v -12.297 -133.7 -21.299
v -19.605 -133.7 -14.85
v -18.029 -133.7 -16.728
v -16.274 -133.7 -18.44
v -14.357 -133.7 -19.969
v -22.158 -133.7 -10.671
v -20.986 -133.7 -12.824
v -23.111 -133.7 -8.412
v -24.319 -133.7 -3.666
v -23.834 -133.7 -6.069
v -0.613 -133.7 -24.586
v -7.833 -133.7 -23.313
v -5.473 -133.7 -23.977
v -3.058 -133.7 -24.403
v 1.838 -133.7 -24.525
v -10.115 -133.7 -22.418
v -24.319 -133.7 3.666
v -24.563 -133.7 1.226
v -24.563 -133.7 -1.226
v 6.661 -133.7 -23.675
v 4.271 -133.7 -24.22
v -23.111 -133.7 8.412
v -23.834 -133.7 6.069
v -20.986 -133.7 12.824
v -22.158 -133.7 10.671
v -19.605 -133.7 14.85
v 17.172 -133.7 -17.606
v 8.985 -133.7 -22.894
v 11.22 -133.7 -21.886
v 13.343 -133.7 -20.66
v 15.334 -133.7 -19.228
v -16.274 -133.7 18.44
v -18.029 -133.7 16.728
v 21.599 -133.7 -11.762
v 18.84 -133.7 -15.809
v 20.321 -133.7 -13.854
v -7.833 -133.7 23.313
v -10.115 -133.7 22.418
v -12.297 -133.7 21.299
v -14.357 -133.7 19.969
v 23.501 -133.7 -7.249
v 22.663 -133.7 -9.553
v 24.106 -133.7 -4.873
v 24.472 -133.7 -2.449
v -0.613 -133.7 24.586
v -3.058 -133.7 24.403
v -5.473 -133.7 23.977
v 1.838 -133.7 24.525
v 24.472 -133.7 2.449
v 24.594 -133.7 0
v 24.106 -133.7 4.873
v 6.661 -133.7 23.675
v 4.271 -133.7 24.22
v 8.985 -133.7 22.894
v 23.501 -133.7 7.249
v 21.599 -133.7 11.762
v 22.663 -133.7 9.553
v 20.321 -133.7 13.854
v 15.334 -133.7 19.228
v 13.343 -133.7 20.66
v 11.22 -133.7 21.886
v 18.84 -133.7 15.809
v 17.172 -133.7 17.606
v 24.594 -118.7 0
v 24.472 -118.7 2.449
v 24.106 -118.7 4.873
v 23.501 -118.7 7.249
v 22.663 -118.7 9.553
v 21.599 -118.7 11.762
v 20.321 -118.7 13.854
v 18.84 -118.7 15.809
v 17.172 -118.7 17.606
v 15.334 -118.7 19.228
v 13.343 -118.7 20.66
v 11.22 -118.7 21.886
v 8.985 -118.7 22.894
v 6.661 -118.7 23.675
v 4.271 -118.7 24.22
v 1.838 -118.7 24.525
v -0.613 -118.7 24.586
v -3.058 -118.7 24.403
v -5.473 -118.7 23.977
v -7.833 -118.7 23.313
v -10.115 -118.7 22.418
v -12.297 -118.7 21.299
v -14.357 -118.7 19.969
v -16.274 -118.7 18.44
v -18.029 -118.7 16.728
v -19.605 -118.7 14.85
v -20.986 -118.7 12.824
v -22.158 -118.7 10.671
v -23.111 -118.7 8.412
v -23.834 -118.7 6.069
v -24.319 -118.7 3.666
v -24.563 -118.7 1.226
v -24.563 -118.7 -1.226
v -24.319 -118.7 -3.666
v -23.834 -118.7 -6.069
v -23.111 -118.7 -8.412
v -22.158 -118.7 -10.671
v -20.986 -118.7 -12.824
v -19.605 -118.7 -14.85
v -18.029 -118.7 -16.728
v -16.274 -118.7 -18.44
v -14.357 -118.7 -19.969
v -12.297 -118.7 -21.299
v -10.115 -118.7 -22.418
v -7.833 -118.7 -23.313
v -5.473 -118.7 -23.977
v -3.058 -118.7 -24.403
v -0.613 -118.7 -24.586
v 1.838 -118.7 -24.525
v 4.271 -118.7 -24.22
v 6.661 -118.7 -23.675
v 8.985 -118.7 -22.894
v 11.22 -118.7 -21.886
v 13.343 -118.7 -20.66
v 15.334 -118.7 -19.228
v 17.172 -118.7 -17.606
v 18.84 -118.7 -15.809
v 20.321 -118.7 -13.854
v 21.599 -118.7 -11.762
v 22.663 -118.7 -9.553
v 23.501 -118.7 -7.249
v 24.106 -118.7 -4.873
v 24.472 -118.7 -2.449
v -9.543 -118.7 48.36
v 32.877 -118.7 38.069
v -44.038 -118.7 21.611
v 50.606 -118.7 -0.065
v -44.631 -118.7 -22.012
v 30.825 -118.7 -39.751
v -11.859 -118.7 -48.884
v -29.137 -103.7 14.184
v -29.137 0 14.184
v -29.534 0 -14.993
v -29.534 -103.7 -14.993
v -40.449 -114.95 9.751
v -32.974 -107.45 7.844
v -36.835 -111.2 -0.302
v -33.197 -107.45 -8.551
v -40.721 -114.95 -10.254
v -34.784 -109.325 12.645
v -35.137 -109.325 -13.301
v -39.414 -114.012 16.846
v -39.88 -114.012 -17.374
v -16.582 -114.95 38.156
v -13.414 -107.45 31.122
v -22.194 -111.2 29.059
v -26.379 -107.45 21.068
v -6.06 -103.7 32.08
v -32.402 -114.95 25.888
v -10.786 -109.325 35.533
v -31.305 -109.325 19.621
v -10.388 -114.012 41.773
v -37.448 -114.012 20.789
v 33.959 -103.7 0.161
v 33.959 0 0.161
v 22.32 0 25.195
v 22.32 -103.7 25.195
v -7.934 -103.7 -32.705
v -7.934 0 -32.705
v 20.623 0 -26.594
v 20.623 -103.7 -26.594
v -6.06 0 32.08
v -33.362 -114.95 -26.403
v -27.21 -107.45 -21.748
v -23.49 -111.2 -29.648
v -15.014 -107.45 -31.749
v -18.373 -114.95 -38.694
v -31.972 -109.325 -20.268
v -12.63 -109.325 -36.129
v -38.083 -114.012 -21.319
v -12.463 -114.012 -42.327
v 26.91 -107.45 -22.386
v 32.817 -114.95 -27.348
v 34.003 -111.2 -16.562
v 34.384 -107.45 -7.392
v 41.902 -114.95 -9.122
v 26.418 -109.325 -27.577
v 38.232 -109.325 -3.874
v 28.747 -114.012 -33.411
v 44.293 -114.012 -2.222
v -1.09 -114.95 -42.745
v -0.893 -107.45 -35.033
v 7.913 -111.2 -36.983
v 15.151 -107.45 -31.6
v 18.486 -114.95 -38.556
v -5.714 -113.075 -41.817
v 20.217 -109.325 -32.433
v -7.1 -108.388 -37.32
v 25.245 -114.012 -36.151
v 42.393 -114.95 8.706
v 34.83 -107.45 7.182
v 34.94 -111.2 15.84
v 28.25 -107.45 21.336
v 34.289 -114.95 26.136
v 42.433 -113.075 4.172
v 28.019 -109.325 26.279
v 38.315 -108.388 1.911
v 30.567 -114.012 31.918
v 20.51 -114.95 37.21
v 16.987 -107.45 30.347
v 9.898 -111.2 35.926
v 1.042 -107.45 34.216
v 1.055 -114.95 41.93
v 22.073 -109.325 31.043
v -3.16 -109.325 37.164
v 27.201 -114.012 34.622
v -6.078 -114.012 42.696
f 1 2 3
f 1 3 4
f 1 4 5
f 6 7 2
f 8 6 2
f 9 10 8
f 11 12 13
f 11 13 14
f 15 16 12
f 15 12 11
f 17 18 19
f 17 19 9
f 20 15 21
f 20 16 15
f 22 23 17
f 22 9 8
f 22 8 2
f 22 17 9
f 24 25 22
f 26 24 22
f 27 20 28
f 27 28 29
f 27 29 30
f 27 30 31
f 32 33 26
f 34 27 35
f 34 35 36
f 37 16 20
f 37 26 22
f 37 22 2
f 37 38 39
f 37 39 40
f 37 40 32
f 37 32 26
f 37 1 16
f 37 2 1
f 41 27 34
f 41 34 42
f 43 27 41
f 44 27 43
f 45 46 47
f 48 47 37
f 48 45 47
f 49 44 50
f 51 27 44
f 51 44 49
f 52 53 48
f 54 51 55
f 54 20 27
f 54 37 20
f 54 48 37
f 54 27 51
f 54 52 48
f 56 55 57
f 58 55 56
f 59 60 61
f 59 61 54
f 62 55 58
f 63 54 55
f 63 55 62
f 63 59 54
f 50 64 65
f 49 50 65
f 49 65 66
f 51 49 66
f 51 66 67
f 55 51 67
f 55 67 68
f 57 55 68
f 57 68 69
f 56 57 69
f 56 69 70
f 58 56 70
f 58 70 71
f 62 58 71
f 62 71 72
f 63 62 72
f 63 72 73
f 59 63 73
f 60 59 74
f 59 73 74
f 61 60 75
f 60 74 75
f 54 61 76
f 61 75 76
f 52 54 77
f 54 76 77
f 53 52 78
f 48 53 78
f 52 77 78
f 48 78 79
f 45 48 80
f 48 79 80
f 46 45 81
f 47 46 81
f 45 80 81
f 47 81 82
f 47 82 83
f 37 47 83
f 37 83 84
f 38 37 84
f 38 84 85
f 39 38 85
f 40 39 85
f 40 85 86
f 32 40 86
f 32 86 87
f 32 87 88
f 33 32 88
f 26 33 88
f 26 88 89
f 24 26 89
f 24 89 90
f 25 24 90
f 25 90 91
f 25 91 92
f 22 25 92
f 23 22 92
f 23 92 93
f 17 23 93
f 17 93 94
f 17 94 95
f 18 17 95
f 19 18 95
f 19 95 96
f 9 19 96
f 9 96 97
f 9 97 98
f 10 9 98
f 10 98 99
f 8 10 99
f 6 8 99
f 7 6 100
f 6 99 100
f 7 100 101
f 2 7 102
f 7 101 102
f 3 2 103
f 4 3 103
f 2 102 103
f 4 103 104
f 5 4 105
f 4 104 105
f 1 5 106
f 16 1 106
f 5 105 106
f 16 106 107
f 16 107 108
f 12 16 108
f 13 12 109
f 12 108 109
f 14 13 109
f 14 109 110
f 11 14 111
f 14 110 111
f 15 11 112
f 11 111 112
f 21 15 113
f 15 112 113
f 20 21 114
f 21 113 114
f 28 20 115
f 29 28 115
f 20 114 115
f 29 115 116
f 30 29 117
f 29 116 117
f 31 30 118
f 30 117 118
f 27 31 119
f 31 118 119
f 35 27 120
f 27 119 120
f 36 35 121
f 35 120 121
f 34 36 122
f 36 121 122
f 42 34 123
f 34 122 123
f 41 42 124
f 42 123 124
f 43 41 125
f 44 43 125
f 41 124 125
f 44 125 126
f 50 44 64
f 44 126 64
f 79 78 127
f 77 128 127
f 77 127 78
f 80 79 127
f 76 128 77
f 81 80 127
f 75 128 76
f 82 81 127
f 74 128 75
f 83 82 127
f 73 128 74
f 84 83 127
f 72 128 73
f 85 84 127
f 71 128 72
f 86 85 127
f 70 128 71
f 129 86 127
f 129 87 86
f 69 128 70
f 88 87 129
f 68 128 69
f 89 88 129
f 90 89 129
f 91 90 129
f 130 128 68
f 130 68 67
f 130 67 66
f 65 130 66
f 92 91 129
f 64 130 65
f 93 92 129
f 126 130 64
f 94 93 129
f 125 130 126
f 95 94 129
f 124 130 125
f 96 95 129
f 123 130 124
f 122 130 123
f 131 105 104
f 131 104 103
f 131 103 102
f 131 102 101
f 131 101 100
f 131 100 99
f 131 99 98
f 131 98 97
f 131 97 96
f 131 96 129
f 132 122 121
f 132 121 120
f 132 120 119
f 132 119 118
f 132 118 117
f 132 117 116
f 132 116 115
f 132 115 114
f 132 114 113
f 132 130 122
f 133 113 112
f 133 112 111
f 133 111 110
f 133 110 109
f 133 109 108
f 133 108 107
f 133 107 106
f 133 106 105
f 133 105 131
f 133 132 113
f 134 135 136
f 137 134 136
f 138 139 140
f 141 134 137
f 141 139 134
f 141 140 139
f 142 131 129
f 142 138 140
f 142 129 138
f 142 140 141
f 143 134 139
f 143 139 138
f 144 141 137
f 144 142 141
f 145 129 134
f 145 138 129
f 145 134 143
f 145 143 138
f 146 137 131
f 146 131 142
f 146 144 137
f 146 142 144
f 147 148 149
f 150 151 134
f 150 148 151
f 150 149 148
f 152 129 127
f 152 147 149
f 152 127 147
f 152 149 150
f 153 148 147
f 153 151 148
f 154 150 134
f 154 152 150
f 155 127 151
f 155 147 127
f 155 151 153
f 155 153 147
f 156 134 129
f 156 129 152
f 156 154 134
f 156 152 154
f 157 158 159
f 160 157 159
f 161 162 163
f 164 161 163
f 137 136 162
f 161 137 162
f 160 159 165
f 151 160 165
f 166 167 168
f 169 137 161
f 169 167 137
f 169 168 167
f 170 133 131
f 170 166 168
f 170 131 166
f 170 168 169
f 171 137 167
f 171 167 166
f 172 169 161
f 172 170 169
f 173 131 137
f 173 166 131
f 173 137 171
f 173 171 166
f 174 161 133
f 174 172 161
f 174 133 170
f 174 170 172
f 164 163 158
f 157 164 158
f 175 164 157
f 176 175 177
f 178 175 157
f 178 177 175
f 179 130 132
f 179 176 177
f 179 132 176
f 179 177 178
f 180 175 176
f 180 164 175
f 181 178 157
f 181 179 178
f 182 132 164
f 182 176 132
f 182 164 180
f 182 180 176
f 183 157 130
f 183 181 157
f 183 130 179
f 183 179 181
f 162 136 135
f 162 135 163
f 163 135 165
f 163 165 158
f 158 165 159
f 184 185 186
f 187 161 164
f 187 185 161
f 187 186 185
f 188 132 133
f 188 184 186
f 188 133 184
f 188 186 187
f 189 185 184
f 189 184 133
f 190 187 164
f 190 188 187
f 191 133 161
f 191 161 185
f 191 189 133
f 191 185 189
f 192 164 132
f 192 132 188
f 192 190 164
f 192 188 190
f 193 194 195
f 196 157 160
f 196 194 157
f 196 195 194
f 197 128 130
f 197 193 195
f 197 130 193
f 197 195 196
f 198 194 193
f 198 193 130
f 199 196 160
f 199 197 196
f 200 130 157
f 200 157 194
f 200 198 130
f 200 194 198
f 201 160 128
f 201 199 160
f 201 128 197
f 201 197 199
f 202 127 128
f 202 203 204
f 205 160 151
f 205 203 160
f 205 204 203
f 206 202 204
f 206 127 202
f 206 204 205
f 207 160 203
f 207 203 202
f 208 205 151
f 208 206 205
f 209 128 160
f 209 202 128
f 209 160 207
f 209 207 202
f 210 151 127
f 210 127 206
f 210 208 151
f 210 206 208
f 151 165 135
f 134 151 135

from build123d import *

# Parameters (mm, degrees)
F1_DEPTH  = 103.7
F2_R      = 24.5940307027
F3_DEPTH  = 30
F1_FACE_R = 24.5940307027
F4_DEPTH  = 15
F4_TAPER  = -45


with BuildPart() as f1:
    # F0 (on Front) → F1 (new body)
    with BuildSketch(Plane.XZ):
        Polygon((22.3202445945, 25.194608101), (-6.0597066768, 32.0796431042), (-29.137253995, 14.1840528394), (-29.5342159325, -14.9930742126), (-7.9341934053, -32.7045573648), (20.6225638938, -26.5941601835), (33.9587605911, 0.1614082956), align=None)
    extrude(amount=F1_DEPTH)

    # F2 (on face) → F3 (join)
    with BuildSketch(Plane.XZ.offset(103.7)):
        Circle(F2_R)
    extrude(amount=F3_DEPTH)

    # F1_face (on face) → F4 (join)
    with BuildSketch(Plane(origin=(0.6027987413, -103.7, -0.3810429476), x_dir=(1, 0, 0), z_dir=(0, -1, 0))):
        Polygon((21.7174458532, 25.5756510486), (-6.662505418, 32.4606860518), (-29.7400527363, 14.565095787), (-30.1370146738, -14.612031265), (-8.5369921466, -32.3235144172), (20.0197651525, -26.2131172359), (33.3559618499, 0.5424512432), align=None)
        with Locations((-0.6027987413, 0.3810429476)):
            Circle(F1_FACE_R, mode=Mode.SUBTRACT)
    extrude(amount=F4_DEPTH, taper=F4_TAPER)


solid = f1.part
